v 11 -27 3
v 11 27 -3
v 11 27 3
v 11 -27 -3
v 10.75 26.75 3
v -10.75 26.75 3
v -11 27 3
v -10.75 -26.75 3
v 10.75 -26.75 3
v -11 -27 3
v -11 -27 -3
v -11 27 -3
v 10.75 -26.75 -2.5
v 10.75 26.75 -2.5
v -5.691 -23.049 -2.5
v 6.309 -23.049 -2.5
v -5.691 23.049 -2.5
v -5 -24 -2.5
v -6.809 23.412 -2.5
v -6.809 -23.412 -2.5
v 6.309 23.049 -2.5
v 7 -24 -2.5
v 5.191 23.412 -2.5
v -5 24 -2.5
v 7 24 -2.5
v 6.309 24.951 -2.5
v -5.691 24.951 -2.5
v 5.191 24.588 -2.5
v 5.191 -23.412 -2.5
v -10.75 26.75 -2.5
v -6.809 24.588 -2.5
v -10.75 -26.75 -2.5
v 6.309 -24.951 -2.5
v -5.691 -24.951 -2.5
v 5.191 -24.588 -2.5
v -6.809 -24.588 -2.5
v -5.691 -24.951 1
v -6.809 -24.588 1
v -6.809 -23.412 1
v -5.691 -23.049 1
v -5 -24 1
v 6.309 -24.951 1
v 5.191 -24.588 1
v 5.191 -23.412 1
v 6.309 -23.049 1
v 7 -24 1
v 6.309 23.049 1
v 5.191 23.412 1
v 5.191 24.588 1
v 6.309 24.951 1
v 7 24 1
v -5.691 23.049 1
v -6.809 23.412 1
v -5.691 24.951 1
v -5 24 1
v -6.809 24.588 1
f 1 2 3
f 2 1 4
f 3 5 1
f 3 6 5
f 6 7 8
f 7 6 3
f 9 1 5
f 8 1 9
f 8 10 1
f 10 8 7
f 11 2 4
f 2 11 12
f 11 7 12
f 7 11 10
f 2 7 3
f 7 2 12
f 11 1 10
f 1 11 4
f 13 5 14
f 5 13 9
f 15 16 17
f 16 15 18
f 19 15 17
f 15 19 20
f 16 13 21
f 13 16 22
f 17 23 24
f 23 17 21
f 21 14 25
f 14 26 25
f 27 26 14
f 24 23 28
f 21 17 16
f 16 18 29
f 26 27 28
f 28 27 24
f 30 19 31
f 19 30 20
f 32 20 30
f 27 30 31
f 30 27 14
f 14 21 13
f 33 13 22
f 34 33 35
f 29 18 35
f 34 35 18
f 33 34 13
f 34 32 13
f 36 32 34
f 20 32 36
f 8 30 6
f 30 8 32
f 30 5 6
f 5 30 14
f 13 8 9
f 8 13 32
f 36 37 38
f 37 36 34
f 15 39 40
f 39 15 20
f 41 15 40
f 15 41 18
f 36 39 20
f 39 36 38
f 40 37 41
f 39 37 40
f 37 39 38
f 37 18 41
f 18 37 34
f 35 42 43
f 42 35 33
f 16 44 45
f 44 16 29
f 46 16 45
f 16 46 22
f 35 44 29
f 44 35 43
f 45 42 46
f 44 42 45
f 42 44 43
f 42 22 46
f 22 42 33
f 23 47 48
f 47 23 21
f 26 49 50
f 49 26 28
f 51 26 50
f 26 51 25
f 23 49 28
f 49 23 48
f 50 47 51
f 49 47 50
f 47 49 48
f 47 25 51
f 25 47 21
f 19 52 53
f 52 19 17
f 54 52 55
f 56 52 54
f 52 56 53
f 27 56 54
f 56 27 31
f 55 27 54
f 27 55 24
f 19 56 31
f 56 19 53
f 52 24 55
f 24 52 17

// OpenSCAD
//casing bottom
difference() {
    cube([22,54,6], true);   
    
    translate([0,0,0.5]) {
        cube([21.5,53.5,6], true);
        }
    }
    
//connections to pico
translate([-6,-24,-1]){
    cylinder(h = 4, r=1, center = true);
    } 
    
translate([6,-24,-1]){
    cylinder(h = 4, r=1, center = true);
    } 
    
translate([6,24,-1]){
    cylinder(h = 4, r=1, center = true);
    } 
    
translate([-6,24,-1]){
    cylinder(h = 4, r=1, center = true);
    } 
    
 
